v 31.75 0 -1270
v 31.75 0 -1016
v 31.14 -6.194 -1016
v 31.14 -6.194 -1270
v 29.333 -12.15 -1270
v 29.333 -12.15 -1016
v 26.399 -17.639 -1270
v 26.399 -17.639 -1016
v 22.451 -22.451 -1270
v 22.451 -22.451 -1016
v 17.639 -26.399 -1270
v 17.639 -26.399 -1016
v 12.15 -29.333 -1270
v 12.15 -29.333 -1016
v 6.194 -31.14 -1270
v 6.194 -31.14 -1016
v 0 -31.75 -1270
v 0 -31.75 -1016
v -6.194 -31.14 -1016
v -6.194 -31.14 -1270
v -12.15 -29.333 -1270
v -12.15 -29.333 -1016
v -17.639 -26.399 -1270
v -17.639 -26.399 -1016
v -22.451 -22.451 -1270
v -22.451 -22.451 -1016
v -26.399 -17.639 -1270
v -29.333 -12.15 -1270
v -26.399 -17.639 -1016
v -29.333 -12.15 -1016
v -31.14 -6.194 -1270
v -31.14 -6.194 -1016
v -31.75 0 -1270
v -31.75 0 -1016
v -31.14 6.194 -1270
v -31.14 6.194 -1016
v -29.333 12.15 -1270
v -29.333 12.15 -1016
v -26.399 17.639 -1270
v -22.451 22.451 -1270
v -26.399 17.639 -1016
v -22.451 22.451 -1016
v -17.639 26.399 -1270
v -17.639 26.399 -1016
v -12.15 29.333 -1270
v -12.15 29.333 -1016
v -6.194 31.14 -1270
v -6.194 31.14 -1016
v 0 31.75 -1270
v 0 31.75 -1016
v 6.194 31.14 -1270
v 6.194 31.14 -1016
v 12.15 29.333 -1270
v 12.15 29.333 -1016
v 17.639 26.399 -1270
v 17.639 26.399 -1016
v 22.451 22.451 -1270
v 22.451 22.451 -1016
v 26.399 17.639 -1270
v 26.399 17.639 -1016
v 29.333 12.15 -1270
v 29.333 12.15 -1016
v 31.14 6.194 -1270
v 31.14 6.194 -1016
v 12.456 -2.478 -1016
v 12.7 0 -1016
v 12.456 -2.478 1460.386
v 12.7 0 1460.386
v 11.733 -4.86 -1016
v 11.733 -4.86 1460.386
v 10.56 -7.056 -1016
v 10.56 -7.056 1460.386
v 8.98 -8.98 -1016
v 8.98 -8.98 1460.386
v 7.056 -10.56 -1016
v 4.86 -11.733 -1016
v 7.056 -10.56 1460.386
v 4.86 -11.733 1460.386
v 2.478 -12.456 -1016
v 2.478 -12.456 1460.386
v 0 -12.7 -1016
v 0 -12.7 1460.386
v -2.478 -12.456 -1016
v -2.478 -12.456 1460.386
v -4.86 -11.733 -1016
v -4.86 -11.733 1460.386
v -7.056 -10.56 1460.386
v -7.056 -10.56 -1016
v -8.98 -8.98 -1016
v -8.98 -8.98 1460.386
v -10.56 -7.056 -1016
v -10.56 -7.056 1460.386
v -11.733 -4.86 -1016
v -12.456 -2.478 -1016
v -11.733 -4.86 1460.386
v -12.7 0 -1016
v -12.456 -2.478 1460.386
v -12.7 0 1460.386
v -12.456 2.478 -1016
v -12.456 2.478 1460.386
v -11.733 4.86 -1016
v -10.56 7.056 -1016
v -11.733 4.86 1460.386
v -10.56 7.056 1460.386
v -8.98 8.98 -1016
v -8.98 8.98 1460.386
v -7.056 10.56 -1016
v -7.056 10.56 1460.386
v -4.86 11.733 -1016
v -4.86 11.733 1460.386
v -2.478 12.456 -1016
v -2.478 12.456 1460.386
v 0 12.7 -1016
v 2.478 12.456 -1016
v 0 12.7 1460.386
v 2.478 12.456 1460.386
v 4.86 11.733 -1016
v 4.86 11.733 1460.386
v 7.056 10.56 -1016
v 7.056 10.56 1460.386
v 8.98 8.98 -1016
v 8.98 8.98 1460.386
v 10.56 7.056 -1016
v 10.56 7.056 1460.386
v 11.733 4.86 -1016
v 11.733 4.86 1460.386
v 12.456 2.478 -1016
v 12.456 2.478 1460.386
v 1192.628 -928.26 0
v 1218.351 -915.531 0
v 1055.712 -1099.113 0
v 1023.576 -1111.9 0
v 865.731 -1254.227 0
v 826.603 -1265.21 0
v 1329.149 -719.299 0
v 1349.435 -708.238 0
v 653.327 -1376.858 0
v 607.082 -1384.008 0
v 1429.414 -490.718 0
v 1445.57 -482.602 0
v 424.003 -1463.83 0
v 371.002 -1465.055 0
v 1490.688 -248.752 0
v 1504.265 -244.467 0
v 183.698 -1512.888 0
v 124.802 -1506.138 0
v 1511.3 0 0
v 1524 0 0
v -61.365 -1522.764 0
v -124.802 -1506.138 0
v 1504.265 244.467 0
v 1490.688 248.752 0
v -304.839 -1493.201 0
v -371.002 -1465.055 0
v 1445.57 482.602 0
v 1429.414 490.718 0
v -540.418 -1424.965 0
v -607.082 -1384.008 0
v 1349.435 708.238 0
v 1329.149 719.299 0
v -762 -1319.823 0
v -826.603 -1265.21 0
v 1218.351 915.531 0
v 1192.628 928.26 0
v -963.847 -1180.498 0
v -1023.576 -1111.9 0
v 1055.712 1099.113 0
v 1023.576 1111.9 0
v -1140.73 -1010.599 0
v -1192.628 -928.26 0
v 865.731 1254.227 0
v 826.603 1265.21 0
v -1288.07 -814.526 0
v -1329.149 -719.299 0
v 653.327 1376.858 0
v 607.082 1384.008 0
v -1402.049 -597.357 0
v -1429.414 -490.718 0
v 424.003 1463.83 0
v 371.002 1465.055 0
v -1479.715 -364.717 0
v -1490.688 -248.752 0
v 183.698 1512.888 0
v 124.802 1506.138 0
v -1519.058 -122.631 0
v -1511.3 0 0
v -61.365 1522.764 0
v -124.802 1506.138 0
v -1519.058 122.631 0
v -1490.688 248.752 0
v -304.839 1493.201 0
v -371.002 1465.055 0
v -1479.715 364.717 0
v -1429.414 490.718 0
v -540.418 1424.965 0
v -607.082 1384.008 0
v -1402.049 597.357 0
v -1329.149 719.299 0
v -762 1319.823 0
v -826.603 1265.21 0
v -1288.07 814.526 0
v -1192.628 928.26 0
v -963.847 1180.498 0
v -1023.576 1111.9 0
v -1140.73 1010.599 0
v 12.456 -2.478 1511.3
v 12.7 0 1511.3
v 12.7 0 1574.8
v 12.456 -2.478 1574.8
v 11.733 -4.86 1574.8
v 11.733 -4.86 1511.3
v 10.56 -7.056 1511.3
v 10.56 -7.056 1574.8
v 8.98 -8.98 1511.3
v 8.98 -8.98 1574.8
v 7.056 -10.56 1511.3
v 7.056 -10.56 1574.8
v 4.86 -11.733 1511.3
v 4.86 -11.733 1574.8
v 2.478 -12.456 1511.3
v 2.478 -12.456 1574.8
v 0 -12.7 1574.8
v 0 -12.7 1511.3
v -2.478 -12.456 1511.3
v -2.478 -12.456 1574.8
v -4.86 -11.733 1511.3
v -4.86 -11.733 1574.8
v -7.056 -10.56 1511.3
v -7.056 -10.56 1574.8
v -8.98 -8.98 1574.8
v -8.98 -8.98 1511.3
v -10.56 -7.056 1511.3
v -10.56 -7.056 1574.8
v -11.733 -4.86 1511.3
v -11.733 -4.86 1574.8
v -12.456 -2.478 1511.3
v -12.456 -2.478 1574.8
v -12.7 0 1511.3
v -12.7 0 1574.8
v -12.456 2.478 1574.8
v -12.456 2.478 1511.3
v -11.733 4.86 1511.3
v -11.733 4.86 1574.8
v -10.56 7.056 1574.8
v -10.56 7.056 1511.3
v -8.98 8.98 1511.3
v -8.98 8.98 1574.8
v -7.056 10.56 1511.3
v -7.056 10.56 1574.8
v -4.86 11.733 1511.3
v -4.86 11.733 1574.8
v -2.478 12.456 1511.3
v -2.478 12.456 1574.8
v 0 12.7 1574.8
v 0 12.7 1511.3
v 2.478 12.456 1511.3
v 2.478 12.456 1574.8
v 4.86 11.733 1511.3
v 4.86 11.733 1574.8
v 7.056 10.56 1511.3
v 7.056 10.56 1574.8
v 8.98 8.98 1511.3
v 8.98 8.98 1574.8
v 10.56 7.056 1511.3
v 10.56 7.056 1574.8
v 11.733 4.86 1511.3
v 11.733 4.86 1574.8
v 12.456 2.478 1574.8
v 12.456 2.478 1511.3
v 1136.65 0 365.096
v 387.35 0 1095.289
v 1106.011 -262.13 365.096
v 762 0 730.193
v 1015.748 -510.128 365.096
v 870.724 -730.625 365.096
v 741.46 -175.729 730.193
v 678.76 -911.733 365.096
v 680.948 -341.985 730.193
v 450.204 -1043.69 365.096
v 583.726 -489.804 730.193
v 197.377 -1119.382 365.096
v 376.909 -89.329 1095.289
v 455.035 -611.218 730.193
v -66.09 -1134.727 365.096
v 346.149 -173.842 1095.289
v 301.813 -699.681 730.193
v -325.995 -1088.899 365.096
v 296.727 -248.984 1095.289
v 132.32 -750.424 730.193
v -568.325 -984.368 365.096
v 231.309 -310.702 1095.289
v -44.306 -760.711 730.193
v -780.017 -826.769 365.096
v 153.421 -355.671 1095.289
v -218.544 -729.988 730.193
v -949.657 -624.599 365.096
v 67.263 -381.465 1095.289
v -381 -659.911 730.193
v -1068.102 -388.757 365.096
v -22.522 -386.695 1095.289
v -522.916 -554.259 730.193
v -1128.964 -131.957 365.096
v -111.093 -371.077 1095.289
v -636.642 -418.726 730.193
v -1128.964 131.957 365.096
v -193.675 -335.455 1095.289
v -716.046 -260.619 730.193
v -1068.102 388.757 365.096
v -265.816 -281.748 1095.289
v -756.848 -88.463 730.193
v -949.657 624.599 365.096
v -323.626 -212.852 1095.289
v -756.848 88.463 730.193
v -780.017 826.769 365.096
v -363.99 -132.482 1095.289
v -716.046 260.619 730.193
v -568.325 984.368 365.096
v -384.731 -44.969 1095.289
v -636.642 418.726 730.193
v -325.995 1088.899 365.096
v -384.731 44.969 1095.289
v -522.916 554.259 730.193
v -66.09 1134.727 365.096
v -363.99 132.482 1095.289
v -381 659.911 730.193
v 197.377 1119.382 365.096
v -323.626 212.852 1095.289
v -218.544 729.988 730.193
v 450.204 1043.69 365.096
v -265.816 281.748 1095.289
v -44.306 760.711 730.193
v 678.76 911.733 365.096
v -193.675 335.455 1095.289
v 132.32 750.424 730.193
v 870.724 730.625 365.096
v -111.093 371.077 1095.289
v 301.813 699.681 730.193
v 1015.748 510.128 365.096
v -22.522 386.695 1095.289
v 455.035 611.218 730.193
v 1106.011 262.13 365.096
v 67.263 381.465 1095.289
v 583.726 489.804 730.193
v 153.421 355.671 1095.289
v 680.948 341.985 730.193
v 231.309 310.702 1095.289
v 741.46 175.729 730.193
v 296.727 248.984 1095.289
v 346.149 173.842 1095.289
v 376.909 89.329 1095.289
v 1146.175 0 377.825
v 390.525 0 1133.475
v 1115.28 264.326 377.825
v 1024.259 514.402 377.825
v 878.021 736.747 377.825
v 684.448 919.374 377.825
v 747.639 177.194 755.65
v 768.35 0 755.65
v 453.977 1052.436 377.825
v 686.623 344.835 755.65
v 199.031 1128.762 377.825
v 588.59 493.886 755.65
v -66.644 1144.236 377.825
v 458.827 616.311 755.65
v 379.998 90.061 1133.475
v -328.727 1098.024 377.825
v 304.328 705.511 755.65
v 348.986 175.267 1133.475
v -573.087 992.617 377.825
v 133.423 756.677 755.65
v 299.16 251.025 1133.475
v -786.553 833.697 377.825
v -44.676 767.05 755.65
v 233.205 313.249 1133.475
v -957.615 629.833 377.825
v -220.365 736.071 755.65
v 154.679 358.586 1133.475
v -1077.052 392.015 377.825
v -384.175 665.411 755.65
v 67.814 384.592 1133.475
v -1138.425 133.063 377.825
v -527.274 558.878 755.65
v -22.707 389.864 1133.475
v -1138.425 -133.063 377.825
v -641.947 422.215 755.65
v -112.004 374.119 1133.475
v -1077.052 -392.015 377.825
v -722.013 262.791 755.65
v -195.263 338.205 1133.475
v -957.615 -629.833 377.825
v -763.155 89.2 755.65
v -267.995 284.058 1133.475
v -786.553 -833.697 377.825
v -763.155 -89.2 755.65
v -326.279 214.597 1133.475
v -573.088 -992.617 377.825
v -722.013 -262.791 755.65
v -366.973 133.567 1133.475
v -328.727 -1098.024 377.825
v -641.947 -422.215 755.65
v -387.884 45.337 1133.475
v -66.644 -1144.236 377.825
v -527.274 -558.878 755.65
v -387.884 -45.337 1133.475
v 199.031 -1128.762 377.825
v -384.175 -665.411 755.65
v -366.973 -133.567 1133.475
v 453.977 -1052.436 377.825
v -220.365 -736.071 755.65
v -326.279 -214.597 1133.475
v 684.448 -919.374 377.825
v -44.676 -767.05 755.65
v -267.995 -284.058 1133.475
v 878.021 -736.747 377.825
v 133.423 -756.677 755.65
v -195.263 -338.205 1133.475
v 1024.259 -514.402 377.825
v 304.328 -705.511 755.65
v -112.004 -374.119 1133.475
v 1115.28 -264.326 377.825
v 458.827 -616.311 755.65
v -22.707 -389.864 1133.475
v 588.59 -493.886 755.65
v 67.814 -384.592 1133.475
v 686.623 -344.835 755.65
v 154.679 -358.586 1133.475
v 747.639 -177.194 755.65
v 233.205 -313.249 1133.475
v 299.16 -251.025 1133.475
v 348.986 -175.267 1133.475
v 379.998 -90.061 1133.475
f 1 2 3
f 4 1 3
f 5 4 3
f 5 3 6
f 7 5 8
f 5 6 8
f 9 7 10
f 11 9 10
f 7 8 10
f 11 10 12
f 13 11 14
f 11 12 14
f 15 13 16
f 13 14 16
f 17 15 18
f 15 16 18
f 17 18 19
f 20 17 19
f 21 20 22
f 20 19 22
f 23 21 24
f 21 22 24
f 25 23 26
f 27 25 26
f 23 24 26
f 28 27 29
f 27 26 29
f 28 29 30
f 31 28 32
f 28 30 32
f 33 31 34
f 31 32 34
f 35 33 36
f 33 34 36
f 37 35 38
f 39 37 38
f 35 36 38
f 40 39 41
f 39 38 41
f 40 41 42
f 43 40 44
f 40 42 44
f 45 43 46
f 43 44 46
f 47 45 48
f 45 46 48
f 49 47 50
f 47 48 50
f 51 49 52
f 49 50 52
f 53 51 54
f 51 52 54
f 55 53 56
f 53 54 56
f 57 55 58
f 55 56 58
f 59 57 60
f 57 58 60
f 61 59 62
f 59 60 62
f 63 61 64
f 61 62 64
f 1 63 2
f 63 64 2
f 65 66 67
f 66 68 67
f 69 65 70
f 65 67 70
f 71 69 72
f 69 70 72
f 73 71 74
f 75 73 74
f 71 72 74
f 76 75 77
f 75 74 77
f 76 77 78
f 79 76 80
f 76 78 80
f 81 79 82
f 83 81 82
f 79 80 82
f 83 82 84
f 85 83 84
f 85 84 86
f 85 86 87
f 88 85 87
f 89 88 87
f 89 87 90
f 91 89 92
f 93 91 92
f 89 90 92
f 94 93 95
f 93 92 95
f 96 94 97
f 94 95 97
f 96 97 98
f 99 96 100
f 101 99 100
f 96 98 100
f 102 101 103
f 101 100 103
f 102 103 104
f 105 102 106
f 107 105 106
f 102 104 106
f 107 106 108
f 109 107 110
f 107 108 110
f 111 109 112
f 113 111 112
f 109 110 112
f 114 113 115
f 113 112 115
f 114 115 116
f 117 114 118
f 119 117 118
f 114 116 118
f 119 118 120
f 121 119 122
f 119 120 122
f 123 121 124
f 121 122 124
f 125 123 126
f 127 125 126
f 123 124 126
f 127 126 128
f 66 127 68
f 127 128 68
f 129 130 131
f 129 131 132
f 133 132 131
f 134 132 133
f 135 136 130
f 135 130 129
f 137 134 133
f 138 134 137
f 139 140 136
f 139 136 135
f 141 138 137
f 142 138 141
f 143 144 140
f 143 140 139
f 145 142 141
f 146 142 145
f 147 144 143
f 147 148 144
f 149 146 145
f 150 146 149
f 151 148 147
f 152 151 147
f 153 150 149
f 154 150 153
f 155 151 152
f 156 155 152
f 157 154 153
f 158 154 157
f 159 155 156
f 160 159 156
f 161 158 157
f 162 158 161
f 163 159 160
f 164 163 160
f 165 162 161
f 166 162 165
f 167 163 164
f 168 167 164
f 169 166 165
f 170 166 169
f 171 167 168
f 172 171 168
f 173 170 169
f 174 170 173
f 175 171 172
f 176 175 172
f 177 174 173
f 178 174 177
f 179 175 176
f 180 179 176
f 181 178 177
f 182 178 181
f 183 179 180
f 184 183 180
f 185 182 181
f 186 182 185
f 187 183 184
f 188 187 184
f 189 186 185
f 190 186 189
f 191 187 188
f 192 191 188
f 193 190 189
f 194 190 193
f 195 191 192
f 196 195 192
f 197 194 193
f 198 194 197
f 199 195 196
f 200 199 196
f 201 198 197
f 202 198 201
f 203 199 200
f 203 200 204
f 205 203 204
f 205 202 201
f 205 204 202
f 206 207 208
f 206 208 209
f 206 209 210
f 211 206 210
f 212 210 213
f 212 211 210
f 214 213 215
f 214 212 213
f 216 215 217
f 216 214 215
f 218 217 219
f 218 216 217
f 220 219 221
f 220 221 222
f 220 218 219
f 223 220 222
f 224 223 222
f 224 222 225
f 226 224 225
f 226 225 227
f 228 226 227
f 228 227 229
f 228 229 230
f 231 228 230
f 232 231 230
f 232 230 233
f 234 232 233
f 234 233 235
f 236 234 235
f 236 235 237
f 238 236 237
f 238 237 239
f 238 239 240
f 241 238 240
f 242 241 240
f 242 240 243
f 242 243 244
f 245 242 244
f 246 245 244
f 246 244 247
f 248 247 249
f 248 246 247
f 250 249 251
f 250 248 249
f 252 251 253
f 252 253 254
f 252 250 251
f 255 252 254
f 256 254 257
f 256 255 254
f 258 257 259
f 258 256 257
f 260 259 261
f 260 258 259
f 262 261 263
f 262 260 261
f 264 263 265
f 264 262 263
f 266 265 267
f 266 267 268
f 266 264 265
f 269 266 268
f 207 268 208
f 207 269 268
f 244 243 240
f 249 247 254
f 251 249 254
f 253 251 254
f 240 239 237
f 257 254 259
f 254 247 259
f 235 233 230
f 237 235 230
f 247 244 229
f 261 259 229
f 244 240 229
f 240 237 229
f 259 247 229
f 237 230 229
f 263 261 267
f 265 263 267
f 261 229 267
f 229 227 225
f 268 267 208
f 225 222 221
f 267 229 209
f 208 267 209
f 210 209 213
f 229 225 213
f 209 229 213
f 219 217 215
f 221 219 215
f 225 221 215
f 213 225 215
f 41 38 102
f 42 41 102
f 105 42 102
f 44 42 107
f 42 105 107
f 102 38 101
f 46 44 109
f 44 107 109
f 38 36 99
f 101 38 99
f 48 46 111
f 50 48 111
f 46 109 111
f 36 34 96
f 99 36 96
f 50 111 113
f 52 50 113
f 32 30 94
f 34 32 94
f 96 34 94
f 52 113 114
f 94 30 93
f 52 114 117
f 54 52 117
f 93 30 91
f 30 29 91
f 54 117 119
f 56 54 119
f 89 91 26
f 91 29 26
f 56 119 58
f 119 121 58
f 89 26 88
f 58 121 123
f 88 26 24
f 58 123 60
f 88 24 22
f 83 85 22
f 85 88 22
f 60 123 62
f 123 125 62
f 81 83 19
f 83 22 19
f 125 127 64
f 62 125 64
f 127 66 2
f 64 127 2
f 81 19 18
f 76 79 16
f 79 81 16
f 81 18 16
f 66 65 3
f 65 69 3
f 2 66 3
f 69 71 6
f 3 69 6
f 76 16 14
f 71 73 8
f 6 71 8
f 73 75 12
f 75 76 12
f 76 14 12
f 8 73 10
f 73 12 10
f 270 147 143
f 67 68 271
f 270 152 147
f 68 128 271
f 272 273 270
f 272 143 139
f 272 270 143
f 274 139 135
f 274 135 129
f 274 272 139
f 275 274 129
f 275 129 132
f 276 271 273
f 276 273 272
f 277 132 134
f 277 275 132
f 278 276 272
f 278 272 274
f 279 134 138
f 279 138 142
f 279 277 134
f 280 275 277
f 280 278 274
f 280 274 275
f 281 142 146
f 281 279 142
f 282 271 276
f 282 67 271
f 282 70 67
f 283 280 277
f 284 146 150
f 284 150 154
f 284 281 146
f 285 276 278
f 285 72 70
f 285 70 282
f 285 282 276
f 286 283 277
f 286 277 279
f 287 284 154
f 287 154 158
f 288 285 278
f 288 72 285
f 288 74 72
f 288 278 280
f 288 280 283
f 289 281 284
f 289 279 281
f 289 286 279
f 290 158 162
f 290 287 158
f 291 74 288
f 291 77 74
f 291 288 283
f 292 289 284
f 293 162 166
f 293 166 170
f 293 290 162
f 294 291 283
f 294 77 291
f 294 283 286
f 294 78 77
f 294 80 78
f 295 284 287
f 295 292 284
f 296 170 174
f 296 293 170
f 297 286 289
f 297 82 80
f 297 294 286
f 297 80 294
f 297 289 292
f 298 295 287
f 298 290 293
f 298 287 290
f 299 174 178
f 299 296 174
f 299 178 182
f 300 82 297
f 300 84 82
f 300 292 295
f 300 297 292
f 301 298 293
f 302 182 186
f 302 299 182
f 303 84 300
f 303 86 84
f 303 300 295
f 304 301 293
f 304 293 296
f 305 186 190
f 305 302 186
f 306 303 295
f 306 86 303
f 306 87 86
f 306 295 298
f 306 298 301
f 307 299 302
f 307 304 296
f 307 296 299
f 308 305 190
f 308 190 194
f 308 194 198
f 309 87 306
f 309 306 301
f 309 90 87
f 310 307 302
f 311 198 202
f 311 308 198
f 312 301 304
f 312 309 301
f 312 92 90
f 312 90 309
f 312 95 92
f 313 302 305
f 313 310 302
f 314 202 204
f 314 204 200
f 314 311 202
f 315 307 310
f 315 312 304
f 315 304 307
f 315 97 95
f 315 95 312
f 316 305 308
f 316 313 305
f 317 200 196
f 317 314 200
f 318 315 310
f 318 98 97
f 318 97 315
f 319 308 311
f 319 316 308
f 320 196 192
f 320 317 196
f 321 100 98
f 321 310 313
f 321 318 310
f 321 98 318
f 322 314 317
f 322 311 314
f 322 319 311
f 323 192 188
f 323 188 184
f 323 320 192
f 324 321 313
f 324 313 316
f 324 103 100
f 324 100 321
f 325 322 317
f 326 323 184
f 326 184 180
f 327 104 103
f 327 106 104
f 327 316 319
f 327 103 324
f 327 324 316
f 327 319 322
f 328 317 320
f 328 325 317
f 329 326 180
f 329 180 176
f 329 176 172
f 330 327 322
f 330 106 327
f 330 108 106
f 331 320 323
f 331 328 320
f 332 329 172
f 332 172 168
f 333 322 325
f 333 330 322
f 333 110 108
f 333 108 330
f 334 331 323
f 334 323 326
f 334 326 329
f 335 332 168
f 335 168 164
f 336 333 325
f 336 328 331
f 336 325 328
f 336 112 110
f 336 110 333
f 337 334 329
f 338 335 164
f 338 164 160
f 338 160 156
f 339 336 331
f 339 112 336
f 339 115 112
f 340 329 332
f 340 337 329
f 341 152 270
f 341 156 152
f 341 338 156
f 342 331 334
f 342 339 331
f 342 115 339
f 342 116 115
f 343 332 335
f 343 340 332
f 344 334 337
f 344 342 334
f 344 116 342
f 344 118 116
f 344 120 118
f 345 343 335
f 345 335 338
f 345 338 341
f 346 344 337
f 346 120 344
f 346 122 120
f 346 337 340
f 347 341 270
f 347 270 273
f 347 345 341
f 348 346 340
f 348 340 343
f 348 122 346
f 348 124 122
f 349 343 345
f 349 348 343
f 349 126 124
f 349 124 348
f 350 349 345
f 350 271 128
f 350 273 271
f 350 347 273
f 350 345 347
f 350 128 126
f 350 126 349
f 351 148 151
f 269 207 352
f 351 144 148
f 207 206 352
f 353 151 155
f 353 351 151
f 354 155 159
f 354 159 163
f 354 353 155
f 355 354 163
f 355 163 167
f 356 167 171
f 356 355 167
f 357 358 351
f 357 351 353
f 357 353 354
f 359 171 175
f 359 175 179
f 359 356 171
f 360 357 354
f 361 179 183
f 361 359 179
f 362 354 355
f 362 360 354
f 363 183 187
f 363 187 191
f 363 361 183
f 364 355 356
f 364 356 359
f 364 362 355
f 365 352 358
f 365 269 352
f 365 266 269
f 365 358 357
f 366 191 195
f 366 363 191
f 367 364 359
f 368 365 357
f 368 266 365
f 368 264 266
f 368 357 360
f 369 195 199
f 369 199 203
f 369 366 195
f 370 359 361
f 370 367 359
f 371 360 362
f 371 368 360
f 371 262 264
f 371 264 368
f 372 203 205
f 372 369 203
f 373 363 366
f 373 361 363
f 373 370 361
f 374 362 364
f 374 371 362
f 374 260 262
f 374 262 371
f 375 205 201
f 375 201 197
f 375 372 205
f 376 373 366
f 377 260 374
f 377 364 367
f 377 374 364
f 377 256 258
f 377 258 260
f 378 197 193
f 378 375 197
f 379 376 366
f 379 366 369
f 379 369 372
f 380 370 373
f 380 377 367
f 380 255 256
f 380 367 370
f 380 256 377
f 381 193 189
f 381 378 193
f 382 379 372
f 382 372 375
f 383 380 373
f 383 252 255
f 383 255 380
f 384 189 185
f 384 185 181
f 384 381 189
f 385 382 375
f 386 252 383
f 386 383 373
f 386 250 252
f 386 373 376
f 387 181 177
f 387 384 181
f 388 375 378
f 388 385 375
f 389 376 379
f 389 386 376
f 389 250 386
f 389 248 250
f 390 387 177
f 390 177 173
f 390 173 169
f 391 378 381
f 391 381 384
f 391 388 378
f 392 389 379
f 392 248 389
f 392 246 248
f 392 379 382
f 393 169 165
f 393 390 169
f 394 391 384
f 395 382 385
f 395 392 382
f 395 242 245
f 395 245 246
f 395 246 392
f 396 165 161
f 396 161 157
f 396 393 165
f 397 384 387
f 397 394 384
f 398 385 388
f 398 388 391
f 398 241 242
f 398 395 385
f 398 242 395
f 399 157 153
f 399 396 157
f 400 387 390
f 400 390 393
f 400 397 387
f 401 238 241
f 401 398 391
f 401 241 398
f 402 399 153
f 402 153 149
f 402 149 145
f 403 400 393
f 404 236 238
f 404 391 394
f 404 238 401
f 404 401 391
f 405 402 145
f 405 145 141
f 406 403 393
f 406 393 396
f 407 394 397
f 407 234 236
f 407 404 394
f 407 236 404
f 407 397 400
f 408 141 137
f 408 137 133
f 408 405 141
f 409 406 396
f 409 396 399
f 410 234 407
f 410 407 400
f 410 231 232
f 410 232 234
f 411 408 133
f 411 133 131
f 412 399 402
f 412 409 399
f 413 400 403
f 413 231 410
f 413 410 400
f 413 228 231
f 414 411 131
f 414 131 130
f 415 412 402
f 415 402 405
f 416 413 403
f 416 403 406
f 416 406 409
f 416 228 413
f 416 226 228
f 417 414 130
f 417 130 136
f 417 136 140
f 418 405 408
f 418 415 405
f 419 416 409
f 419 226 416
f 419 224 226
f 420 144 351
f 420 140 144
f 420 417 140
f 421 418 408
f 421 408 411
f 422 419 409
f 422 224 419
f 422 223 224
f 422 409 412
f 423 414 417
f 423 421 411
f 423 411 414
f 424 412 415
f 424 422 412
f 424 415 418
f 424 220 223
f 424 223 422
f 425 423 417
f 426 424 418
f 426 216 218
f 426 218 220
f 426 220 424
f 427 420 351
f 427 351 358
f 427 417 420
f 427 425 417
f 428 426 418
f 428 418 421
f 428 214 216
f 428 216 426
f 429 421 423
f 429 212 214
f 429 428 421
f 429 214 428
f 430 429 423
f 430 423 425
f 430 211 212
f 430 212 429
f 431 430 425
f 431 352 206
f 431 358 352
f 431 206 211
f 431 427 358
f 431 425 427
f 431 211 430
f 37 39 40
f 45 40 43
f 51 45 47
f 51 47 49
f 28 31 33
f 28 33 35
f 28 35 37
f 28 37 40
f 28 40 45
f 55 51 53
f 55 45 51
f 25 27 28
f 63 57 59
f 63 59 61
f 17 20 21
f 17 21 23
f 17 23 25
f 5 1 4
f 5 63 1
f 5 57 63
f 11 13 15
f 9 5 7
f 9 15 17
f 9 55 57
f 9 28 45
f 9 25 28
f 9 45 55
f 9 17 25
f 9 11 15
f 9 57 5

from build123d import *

# Parameters (mm, degrees)
F4_R          = 12.7
F5_DEPTH      = 1574.8
F5_DEPTH_BACK = 1016
F6_R          = 31.75
F7_DEPTH      = 254


with BuildPart() as f1:
    # F0 (on Front) → F1 (revolve)
    with BuildSketch(Plane.XZ):
        Polygon((0, 1524), (0, 0), (1524, 0), align=None)
    revolve(axis=Axis((0, 0, 762), (0, 0, 1)))

    # F2 (on Front) → F3 (revolve, cut)
    with BuildSketch(Plane.XZ):
        Polygon((0, 1472.7621078491), (0, 0), (1511.3, 0), align=None)
    revolve(axis=Axis((0, 0, 736.3810539246), (0, 0, -1)), mode=Mode.SUBTRACT)

    # F4 (on face) → F5 (join, two sides)
    with BuildSketch(Plane(origin=(0, 0, 0), x_dir=(1, 0, 0), z_dir=(0, 0, -1))) as f5_sk:
        Circle(F4_R)
    extrude(amount=-F5_DEPTH)
    extrude(f5_sk.sketch, amount=F5_DEPTH_BACK)

    # F6 (on face) → F7 (join)
    with BuildSketch(Plane(origin=(0, 0, -1016), x_dir=(1, 0, 0), z_dir=(0, 0, -1))):
        Circle(F6_R)
    extrude(amount=F7_DEPTH)


solid = f1.part
